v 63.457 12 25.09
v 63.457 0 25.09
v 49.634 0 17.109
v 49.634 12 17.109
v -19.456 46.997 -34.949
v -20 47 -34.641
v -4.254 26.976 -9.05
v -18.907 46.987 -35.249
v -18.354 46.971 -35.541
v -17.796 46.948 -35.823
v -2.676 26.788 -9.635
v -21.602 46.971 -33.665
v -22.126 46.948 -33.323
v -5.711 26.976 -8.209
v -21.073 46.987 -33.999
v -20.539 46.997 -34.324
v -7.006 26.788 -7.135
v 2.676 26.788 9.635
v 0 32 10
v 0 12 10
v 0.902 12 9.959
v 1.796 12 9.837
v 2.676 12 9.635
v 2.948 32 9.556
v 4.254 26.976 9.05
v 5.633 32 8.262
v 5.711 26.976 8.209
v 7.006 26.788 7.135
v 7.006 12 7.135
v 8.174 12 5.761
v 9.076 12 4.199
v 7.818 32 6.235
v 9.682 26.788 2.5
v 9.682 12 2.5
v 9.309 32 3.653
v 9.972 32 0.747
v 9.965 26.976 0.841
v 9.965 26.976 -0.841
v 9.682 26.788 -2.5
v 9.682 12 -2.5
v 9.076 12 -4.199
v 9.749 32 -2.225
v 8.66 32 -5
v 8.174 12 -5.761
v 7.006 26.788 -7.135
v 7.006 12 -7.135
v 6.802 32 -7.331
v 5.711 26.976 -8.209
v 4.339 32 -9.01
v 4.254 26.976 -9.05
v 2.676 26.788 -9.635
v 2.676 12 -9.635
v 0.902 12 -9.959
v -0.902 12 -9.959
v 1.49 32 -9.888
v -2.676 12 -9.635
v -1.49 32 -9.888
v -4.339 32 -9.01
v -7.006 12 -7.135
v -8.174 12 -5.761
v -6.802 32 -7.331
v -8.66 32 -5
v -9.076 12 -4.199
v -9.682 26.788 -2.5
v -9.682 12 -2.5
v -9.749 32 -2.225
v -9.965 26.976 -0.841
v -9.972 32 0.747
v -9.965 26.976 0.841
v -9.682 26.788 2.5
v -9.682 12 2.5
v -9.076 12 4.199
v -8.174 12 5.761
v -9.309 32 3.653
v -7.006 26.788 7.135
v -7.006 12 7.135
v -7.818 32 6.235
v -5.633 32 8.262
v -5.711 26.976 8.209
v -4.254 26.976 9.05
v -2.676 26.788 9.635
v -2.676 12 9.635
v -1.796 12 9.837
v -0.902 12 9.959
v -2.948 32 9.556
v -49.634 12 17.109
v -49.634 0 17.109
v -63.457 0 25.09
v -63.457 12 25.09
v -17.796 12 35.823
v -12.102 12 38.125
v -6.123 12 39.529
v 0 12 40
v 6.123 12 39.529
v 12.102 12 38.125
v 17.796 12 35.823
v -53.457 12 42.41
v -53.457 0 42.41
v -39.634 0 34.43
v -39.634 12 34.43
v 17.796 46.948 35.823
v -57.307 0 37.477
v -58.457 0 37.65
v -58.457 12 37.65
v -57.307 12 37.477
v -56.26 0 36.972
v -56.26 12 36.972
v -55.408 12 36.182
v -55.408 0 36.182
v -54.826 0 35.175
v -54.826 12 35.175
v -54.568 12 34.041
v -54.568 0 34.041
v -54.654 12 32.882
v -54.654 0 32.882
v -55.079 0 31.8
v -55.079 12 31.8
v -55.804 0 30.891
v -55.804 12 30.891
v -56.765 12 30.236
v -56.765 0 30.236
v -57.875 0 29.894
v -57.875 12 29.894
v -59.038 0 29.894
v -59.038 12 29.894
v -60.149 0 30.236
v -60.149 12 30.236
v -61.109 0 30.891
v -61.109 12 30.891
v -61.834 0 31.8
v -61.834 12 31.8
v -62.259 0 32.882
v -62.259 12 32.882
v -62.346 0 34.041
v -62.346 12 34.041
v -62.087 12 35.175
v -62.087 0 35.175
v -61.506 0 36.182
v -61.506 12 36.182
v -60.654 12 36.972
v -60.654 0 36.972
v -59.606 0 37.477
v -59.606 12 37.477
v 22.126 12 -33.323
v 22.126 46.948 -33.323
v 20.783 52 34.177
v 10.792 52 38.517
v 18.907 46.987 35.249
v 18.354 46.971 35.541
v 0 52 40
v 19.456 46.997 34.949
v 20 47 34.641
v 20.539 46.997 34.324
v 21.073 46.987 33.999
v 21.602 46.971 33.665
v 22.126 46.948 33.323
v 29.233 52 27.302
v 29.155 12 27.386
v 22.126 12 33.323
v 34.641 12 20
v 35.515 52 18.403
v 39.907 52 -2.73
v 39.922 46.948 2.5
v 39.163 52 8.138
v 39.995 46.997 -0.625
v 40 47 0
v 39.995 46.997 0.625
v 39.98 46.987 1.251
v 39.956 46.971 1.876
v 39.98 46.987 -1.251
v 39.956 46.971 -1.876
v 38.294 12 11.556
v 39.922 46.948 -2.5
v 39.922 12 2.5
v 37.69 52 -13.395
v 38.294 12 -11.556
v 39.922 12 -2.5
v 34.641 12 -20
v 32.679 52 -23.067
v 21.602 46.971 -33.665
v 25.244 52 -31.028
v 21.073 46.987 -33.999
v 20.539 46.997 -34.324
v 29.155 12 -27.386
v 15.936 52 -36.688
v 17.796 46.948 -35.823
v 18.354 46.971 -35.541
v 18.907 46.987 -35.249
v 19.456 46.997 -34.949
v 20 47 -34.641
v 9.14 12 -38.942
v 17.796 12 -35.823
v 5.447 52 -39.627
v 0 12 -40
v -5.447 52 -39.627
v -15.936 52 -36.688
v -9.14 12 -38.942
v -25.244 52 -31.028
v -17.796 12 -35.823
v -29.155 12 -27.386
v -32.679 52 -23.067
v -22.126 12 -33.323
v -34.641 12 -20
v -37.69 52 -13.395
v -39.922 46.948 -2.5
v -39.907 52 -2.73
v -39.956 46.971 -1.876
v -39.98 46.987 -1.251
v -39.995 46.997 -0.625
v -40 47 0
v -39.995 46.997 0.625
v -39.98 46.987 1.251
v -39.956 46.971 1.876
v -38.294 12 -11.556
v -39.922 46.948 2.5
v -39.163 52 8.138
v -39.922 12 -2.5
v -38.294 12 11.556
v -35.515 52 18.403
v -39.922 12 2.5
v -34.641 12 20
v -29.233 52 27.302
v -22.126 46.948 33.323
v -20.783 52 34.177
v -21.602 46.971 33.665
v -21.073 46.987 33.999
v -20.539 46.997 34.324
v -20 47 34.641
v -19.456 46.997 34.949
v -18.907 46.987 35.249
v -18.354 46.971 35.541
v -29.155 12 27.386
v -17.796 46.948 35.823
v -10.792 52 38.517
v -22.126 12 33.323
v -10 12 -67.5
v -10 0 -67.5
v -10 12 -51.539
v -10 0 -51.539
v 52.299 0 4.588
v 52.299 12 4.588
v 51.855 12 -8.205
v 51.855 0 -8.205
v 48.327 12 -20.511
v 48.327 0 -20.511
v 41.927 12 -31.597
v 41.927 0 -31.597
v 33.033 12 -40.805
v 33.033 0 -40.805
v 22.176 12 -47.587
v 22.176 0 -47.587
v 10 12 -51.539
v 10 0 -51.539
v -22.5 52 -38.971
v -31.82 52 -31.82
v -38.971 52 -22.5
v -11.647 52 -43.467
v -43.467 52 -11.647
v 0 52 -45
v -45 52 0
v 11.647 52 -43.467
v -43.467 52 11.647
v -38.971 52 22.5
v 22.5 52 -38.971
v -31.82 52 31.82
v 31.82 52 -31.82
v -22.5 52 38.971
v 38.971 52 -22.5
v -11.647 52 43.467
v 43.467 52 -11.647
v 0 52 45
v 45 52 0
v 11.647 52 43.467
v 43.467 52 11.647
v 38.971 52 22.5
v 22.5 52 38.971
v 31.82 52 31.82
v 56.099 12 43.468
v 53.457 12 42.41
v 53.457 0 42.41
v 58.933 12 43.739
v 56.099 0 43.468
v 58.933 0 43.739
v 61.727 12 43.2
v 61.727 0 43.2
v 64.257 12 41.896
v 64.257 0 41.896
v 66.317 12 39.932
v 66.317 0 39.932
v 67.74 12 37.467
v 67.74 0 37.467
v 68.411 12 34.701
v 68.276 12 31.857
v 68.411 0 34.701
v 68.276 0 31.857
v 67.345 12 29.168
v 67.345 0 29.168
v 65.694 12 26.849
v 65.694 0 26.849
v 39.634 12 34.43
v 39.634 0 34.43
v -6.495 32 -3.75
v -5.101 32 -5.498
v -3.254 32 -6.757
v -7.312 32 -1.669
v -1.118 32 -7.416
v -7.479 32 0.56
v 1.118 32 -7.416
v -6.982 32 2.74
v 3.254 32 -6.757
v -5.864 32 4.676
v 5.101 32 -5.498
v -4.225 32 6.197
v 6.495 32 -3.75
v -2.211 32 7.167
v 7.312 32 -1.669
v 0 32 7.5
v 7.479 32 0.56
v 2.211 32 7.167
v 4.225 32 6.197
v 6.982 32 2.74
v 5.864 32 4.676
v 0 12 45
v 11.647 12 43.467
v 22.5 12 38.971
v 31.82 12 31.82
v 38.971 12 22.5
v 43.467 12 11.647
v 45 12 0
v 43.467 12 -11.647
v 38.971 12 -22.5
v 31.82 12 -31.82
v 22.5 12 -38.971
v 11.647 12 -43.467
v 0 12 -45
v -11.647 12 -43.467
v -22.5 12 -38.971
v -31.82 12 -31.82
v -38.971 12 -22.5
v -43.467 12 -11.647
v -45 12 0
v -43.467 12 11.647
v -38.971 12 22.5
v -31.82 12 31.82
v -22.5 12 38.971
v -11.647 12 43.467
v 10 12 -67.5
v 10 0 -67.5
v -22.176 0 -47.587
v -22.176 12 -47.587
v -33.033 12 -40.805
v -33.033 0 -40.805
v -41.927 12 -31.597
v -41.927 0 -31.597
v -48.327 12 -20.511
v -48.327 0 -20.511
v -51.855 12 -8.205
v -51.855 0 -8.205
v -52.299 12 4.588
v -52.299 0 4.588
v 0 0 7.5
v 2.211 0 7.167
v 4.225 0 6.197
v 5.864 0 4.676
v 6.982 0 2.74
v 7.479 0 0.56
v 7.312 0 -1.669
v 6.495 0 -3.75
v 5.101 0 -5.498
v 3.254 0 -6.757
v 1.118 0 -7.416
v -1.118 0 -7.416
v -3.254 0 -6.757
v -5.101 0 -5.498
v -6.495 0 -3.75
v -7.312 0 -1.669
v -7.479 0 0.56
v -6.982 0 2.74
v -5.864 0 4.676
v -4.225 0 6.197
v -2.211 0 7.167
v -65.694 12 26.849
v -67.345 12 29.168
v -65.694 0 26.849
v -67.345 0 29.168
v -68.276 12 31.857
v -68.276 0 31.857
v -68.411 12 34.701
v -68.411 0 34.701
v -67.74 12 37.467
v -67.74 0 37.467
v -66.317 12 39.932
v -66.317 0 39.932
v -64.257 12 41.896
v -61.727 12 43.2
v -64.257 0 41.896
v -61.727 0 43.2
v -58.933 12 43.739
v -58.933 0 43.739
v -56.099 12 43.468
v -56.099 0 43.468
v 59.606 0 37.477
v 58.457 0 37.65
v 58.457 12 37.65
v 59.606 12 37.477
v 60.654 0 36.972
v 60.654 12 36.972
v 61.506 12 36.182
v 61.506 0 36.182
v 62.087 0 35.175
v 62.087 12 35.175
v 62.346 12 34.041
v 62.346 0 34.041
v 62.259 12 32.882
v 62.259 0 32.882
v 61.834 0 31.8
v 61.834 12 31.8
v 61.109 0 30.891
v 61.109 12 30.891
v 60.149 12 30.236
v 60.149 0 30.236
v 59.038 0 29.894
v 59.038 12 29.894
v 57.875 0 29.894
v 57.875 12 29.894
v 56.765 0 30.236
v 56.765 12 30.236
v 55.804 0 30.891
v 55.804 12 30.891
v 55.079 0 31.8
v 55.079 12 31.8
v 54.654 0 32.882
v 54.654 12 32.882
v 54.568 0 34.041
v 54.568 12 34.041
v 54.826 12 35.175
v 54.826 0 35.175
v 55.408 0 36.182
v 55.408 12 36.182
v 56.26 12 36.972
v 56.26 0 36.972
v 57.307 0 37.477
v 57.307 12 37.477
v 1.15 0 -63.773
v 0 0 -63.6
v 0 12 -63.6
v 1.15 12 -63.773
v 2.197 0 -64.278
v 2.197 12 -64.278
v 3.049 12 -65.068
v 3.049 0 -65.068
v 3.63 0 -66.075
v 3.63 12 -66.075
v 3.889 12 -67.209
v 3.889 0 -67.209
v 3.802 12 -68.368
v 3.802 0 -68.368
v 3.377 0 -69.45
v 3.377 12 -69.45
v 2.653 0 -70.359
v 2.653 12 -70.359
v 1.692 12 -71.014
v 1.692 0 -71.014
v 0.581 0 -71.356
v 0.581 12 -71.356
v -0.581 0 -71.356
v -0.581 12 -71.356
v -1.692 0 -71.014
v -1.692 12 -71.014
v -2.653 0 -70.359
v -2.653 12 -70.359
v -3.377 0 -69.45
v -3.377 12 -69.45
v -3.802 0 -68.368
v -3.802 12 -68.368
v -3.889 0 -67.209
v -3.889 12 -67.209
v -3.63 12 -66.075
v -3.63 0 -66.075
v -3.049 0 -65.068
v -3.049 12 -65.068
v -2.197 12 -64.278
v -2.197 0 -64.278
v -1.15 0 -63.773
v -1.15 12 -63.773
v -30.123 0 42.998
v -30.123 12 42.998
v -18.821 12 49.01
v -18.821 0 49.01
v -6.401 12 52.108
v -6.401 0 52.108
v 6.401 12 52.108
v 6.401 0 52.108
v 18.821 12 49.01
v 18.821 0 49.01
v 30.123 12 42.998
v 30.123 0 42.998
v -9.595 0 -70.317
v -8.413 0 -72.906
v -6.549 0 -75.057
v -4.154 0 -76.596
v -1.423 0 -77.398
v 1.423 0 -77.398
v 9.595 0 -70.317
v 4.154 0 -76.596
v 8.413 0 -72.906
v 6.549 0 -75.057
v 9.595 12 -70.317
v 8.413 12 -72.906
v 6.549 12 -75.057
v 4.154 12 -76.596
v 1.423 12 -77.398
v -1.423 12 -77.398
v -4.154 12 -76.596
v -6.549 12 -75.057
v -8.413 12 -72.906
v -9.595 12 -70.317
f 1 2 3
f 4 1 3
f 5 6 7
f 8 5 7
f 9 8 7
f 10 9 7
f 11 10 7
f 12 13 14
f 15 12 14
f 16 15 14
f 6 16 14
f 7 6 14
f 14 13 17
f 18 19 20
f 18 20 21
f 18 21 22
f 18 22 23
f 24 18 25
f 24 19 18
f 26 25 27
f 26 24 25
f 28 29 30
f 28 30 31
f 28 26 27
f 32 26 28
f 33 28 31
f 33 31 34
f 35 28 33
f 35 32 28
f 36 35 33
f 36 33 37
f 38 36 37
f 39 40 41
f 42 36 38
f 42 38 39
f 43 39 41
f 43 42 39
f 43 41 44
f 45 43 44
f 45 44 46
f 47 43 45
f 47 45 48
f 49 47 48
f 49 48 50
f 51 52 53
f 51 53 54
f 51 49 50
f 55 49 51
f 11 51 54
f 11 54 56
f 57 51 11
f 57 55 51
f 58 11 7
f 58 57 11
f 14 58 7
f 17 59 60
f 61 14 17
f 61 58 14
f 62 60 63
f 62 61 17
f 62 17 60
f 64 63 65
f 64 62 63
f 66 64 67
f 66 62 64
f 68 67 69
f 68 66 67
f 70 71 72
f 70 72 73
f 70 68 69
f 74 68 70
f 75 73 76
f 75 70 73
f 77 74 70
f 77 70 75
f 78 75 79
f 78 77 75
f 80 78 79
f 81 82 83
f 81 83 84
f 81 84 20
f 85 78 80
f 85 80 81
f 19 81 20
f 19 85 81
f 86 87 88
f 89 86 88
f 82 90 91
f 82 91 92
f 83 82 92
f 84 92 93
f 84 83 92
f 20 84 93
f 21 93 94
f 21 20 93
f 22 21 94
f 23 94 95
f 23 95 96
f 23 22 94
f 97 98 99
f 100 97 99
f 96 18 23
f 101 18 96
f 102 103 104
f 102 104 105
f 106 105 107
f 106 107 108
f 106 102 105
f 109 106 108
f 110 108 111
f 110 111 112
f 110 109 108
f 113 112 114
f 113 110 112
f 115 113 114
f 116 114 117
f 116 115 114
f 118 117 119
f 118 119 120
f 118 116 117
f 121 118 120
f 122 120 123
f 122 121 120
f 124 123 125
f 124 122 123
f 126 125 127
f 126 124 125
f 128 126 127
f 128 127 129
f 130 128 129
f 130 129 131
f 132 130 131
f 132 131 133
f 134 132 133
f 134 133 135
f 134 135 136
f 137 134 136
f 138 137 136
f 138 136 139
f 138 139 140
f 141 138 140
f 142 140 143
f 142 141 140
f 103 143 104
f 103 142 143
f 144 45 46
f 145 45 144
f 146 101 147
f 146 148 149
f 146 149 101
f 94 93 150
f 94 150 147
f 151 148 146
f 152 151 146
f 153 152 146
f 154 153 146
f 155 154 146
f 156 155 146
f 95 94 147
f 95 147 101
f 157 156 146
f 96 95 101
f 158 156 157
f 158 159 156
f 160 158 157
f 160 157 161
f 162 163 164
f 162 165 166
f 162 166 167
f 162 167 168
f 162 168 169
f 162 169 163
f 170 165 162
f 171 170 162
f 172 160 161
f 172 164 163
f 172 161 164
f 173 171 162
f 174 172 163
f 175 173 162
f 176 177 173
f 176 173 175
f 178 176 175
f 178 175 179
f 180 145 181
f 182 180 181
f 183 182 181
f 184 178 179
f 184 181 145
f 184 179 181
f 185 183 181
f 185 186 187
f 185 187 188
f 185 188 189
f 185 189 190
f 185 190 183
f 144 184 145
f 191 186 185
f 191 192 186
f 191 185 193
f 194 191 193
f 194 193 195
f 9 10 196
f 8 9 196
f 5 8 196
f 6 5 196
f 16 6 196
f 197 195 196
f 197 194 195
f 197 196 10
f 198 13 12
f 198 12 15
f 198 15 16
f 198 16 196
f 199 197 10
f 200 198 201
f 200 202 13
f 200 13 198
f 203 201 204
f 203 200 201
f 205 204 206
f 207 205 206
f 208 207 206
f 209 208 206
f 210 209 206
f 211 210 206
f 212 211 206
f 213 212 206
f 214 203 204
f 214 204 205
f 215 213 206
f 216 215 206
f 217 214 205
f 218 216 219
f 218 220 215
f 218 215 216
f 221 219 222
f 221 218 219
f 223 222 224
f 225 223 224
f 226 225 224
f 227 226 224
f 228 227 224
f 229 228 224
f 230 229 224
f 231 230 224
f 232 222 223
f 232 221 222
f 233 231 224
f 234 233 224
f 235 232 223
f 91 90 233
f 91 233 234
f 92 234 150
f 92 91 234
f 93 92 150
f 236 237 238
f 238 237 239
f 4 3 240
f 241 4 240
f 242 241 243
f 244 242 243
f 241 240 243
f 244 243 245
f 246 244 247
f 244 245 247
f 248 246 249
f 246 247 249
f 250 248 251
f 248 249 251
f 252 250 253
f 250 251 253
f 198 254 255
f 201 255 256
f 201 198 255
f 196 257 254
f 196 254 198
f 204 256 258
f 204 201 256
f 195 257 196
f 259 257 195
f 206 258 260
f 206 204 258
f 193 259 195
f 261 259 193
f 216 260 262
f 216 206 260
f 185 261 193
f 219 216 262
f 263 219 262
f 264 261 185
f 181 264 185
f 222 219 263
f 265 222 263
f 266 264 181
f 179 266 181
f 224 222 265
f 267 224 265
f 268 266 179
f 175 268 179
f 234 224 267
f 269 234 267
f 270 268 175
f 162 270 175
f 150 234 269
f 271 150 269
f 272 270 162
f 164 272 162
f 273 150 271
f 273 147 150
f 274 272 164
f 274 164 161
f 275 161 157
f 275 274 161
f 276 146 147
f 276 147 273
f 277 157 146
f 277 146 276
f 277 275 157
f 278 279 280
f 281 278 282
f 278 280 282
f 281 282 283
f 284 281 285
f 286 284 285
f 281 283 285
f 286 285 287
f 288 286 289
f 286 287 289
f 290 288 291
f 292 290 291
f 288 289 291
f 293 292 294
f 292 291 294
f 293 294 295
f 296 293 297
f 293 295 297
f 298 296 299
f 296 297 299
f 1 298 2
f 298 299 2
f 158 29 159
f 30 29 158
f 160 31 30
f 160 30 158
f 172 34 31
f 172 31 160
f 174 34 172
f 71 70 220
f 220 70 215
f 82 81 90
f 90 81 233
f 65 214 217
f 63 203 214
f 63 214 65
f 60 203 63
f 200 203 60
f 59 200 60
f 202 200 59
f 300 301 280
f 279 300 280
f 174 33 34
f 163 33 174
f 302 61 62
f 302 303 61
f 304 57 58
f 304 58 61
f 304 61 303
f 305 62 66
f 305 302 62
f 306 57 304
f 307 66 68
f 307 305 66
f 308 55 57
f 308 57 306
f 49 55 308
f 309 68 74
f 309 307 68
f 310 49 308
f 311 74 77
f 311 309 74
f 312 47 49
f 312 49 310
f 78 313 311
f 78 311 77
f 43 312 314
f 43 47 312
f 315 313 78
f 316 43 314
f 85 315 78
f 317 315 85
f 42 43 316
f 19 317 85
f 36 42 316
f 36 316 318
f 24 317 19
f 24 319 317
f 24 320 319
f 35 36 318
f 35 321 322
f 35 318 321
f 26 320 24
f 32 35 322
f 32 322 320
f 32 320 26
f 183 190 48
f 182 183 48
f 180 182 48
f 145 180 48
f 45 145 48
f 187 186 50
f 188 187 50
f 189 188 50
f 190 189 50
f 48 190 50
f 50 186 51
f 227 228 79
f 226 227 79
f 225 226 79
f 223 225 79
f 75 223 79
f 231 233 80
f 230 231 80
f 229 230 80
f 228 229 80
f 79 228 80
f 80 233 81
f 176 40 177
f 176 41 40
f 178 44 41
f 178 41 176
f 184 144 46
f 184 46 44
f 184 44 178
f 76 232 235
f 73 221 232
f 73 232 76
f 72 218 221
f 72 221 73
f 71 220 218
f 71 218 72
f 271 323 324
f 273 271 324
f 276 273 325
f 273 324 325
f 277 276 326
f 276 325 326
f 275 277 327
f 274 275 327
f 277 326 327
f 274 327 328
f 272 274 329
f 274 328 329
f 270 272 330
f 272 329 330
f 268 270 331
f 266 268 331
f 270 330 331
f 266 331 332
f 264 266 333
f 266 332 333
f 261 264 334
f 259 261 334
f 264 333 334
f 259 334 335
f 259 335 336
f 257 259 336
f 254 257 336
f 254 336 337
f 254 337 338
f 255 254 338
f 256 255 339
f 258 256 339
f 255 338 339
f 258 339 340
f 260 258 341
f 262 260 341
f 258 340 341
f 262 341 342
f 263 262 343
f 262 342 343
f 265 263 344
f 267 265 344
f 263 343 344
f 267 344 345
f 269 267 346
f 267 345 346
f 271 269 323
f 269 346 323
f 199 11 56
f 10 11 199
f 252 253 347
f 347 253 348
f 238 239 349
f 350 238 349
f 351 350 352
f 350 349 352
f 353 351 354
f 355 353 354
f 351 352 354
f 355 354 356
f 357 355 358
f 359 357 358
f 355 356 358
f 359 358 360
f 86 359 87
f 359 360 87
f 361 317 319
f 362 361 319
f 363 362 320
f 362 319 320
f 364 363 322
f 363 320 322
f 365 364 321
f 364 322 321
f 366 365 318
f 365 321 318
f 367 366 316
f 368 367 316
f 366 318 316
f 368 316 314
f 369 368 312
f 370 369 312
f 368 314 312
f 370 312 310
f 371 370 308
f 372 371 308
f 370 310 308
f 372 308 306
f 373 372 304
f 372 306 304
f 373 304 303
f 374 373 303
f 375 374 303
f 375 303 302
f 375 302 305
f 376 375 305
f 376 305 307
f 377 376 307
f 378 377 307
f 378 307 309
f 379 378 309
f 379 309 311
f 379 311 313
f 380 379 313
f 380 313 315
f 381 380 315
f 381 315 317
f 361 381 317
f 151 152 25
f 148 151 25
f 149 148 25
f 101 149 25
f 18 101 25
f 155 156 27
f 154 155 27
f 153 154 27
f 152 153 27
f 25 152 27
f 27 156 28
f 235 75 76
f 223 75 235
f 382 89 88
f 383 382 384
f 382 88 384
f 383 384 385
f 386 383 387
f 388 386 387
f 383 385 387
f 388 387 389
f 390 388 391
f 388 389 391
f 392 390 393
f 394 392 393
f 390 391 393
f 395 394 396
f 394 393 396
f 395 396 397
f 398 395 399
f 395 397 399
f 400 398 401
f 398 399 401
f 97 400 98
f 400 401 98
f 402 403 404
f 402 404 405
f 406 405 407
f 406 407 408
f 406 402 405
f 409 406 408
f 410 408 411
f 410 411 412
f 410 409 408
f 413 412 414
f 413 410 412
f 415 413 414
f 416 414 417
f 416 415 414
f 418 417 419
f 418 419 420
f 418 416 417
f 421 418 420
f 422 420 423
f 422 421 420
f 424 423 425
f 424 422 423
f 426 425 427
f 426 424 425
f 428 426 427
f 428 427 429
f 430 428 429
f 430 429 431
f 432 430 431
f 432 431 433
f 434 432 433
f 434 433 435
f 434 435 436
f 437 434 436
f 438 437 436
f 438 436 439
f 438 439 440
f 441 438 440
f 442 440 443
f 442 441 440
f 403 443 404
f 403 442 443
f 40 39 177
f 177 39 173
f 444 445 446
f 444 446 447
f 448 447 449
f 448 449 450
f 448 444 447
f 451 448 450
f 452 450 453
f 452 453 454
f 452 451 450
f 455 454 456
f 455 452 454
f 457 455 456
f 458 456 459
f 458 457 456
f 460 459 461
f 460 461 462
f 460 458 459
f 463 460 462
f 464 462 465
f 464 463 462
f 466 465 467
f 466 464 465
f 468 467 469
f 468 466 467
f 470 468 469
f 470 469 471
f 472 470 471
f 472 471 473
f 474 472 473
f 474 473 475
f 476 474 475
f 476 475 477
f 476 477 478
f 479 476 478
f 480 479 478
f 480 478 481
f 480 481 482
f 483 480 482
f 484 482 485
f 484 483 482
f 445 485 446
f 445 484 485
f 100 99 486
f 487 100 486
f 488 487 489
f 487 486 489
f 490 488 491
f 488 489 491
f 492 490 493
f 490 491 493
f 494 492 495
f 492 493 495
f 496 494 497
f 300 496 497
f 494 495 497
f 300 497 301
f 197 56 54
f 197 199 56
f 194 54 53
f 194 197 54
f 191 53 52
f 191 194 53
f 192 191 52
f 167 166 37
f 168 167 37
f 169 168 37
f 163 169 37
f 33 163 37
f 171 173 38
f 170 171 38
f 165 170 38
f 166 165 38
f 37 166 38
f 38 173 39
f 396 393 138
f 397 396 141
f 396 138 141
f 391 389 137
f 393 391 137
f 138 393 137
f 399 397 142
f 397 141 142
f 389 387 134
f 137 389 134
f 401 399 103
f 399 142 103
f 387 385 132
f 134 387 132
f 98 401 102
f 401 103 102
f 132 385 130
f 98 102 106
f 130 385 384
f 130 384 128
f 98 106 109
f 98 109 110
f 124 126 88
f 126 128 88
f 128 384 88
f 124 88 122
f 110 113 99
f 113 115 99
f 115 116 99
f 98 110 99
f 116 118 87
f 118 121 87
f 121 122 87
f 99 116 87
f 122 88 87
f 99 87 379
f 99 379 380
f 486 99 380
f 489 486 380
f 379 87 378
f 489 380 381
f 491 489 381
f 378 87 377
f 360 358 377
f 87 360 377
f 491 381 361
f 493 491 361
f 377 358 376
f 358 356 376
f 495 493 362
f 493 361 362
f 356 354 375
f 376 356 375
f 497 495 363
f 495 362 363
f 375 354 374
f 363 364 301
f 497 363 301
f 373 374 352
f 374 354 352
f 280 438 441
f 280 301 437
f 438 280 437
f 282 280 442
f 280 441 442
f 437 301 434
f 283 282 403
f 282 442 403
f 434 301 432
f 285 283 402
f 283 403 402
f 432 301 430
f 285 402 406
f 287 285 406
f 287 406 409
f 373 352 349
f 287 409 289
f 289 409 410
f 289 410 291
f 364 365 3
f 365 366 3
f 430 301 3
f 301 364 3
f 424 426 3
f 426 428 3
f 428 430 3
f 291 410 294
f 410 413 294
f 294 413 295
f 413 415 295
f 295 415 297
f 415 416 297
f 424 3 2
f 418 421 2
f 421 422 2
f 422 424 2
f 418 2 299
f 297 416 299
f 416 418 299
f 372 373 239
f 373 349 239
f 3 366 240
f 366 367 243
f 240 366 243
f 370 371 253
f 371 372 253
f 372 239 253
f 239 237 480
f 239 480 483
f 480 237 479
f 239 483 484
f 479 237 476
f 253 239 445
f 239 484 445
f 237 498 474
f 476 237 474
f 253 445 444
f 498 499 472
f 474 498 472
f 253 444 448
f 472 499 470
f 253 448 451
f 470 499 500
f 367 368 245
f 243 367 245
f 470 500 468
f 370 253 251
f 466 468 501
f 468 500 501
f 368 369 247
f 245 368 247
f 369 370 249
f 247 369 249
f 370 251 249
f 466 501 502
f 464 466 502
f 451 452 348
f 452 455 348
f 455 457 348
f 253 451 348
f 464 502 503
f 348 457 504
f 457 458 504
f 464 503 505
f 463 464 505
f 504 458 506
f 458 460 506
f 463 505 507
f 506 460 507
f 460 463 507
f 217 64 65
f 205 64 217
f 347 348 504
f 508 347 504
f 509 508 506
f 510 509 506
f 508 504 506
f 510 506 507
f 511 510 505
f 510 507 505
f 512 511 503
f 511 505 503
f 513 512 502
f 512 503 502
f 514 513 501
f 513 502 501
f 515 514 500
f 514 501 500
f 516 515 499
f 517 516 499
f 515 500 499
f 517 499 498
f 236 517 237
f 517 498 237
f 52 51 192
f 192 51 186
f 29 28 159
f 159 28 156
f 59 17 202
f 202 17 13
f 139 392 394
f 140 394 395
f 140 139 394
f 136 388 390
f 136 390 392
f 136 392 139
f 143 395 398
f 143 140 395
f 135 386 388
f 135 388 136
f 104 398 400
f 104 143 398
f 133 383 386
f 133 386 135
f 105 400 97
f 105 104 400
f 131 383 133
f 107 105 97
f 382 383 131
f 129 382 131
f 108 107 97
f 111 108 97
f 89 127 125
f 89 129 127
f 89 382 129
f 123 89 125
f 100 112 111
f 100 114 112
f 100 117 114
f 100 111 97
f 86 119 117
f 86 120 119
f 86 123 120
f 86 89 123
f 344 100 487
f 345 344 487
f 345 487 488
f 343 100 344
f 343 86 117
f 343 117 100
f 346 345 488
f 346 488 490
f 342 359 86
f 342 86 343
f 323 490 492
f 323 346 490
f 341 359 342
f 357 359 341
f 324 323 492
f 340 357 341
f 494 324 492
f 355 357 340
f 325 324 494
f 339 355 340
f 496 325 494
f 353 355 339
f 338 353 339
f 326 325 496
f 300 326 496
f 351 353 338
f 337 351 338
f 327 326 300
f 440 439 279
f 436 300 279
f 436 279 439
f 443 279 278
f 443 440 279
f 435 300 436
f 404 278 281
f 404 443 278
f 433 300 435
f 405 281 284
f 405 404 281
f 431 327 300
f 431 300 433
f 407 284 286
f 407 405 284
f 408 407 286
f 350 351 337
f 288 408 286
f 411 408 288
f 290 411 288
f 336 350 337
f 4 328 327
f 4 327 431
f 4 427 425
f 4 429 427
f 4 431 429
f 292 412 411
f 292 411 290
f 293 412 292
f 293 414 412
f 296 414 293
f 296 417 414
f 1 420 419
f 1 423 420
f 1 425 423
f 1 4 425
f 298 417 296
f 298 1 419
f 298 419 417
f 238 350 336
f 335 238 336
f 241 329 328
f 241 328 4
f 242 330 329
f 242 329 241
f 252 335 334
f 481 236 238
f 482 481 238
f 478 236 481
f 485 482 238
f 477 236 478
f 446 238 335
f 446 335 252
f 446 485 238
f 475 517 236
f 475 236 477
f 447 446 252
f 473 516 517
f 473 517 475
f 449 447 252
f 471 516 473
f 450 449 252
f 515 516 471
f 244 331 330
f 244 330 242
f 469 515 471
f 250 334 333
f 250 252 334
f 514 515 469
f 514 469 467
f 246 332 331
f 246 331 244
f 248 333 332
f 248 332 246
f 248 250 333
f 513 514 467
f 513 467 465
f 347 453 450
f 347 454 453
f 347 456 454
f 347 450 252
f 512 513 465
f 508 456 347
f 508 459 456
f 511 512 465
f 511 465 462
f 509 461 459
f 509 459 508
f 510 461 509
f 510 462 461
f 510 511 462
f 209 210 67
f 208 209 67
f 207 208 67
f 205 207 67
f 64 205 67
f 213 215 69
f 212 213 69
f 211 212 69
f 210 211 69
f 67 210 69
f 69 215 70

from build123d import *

# Parameters (mm, degrees)
SKETCH1_R           = 3.9
BOSS_EXTRUDE1_DEPTH = 12
SKETCH2_R           = 7.5
CUT_EXTRUDE1_DEPTH  = 12
BOSS_EXTRUDE2_START = 20
SKETCH4_R           = 10
SKETCH4_R_2         = 7.5
BOSS_EXTRUDE2_DEPTH = 20
SKETCH5_R           = 45
SKETCH5_R_2         = 40
BOSS_EXTRUDE3_DEPTH = 40
RIB1_REACH          = 117.744
SKETCH6_WALL_W      = 269.542633736
SKETCH6_WALL_H      = 5
CIRPATTERN1_COUNT   = 6


with BuildPart() as part:
    # Sketch1 → Boss-Extrude1 (new body)
    with BuildSketch(Plane(origin=(0, 0, 0), x_dir=(1, 0, 0), z_dir=(0, 1, 0))):
        with BuildLine():
            ThreePointArc((10, 67.5), (0, 77.5), (-10, 67.5))
            Line((-10, 67.5), (-10, 51.53882032))
            ThreePointArc((-10, 51.53882032), (-45.466333699, 26.25), (-49.633927678, -17.109156122))
            Line((-49.633927678, -17.109156122), (-63.456714755, -25.089745962))
            ThreePointArc((-63.456714755, -25.089745962), (-67.116968793, -38.75), (-53.456714755, -42.410254038))
            Line((-53.456714755, -42.410254038), (-39.633927678, -34.429664198))
            ThreePointArc((-39.633927678, -34.429664198), (0, -52.5), (39.633927678, -34.429664198))
            Line((39.633927678, -34.429664198), (53.456714755, -42.410254038))
            ThreePointArc((53.456714755, -42.410254038), (67.116968793, -38.75), (63.456714755, -25.089745962))
            Line((63.456714755, -25.089745962), (49.633927678, -17.109156122))
            ThreePointArc((49.633927678, -17.109156122), (45.466333699, 26.25), (10, 51.53882032))
            Line((10, 51.53882032), (10, 67.5))
        make_face()
        with Locations((-58.456714755, -33.75)):
            Circle(SKETCH1_R, mode=Mode.SUBTRACT)
        with Locations((58.456714755, -33.75)):
            Circle(SKETCH1_R, mode=Mode.SUBTRACT)
        with Locations((0, 67.5)):
            Circle(SKETCH1_R, mode=Mode.SUBTRACT)
    extrude(amount=BOSS_EXTRUDE1_DEPTH)

    # Sketch2 → Cut-Extrude1 (cut)
    with BuildSketch(Plane(origin=(0, 12, 0), x_dir=(1, 0, 0), z_dir=(0, 1, 0))):
        Circle(SKETCH2_R)
    extrude(amount=-CUT_EXTRUDE1_DEPTH, mode=Mode.SUBTRACT)

    # Sketch4 → Boss-Extrude2 (add)
    with BuildSketch(Plane(origin=(0, 12, 0), x_dir=(1, 0, 0), z_dir=(0, 1, 0)).offset(BOSS_EXTRUDE2_START)):
        Circle(SKETCH4_R)
        Circle(SKETCH4_R_2, mode=Mode.SUBTRACT)
    extrude(amount=-BOSS_EXTRUDE2_DEPTH)

    # Sketch5 → Boss-Extrude3 (add)
    with BuildSketch(Plane(origin=(0, 12, 0), x_dir=(1, 0, 0), z_dir=(0, 1, 0))):
        Circle(SKETCH5_R)
        Circle(SKETCH5_R_2, mode=Mode.SUBTRACT)
    extrude(amount=BOSS_EXTRUDE3_DEPTH)

    # Sketch6 wall → Rib1 (add, up to next)
    with BuildSketch(Plane(origin=(25, 37, 0), x_dir=(0.832050294338, 0.554700196225, 0), z_dir=(-0.554700196225, 0.832050294338, 0)), mode=Mode.PRIVATE) as rib1_sk1:
        Rectangle(SKETCH6_WALL_W, SKETCH6_WALL_H)
    rib1_tool1 = extrude(rib1_sk1.sketch, amount=-RIB1_REACH, mode=Mode.PRIVATE) - part.part
    rib1 = rib1_tool1.solids().sort_by_distance((25, 37, 0))[0]
    add(rib1)

    # CirPattern1: Rib1 ×6 about axis
    cirpattern1_axis = Axis((0, 0, 0), (0, 1, 0))
    for i in range(1, CIRPATTERN1_COUNT):
        add(rib1.rotate(cirpattern1_axis, i * 360 / CIRPATTERN1_COUNT))


solid = part.part
